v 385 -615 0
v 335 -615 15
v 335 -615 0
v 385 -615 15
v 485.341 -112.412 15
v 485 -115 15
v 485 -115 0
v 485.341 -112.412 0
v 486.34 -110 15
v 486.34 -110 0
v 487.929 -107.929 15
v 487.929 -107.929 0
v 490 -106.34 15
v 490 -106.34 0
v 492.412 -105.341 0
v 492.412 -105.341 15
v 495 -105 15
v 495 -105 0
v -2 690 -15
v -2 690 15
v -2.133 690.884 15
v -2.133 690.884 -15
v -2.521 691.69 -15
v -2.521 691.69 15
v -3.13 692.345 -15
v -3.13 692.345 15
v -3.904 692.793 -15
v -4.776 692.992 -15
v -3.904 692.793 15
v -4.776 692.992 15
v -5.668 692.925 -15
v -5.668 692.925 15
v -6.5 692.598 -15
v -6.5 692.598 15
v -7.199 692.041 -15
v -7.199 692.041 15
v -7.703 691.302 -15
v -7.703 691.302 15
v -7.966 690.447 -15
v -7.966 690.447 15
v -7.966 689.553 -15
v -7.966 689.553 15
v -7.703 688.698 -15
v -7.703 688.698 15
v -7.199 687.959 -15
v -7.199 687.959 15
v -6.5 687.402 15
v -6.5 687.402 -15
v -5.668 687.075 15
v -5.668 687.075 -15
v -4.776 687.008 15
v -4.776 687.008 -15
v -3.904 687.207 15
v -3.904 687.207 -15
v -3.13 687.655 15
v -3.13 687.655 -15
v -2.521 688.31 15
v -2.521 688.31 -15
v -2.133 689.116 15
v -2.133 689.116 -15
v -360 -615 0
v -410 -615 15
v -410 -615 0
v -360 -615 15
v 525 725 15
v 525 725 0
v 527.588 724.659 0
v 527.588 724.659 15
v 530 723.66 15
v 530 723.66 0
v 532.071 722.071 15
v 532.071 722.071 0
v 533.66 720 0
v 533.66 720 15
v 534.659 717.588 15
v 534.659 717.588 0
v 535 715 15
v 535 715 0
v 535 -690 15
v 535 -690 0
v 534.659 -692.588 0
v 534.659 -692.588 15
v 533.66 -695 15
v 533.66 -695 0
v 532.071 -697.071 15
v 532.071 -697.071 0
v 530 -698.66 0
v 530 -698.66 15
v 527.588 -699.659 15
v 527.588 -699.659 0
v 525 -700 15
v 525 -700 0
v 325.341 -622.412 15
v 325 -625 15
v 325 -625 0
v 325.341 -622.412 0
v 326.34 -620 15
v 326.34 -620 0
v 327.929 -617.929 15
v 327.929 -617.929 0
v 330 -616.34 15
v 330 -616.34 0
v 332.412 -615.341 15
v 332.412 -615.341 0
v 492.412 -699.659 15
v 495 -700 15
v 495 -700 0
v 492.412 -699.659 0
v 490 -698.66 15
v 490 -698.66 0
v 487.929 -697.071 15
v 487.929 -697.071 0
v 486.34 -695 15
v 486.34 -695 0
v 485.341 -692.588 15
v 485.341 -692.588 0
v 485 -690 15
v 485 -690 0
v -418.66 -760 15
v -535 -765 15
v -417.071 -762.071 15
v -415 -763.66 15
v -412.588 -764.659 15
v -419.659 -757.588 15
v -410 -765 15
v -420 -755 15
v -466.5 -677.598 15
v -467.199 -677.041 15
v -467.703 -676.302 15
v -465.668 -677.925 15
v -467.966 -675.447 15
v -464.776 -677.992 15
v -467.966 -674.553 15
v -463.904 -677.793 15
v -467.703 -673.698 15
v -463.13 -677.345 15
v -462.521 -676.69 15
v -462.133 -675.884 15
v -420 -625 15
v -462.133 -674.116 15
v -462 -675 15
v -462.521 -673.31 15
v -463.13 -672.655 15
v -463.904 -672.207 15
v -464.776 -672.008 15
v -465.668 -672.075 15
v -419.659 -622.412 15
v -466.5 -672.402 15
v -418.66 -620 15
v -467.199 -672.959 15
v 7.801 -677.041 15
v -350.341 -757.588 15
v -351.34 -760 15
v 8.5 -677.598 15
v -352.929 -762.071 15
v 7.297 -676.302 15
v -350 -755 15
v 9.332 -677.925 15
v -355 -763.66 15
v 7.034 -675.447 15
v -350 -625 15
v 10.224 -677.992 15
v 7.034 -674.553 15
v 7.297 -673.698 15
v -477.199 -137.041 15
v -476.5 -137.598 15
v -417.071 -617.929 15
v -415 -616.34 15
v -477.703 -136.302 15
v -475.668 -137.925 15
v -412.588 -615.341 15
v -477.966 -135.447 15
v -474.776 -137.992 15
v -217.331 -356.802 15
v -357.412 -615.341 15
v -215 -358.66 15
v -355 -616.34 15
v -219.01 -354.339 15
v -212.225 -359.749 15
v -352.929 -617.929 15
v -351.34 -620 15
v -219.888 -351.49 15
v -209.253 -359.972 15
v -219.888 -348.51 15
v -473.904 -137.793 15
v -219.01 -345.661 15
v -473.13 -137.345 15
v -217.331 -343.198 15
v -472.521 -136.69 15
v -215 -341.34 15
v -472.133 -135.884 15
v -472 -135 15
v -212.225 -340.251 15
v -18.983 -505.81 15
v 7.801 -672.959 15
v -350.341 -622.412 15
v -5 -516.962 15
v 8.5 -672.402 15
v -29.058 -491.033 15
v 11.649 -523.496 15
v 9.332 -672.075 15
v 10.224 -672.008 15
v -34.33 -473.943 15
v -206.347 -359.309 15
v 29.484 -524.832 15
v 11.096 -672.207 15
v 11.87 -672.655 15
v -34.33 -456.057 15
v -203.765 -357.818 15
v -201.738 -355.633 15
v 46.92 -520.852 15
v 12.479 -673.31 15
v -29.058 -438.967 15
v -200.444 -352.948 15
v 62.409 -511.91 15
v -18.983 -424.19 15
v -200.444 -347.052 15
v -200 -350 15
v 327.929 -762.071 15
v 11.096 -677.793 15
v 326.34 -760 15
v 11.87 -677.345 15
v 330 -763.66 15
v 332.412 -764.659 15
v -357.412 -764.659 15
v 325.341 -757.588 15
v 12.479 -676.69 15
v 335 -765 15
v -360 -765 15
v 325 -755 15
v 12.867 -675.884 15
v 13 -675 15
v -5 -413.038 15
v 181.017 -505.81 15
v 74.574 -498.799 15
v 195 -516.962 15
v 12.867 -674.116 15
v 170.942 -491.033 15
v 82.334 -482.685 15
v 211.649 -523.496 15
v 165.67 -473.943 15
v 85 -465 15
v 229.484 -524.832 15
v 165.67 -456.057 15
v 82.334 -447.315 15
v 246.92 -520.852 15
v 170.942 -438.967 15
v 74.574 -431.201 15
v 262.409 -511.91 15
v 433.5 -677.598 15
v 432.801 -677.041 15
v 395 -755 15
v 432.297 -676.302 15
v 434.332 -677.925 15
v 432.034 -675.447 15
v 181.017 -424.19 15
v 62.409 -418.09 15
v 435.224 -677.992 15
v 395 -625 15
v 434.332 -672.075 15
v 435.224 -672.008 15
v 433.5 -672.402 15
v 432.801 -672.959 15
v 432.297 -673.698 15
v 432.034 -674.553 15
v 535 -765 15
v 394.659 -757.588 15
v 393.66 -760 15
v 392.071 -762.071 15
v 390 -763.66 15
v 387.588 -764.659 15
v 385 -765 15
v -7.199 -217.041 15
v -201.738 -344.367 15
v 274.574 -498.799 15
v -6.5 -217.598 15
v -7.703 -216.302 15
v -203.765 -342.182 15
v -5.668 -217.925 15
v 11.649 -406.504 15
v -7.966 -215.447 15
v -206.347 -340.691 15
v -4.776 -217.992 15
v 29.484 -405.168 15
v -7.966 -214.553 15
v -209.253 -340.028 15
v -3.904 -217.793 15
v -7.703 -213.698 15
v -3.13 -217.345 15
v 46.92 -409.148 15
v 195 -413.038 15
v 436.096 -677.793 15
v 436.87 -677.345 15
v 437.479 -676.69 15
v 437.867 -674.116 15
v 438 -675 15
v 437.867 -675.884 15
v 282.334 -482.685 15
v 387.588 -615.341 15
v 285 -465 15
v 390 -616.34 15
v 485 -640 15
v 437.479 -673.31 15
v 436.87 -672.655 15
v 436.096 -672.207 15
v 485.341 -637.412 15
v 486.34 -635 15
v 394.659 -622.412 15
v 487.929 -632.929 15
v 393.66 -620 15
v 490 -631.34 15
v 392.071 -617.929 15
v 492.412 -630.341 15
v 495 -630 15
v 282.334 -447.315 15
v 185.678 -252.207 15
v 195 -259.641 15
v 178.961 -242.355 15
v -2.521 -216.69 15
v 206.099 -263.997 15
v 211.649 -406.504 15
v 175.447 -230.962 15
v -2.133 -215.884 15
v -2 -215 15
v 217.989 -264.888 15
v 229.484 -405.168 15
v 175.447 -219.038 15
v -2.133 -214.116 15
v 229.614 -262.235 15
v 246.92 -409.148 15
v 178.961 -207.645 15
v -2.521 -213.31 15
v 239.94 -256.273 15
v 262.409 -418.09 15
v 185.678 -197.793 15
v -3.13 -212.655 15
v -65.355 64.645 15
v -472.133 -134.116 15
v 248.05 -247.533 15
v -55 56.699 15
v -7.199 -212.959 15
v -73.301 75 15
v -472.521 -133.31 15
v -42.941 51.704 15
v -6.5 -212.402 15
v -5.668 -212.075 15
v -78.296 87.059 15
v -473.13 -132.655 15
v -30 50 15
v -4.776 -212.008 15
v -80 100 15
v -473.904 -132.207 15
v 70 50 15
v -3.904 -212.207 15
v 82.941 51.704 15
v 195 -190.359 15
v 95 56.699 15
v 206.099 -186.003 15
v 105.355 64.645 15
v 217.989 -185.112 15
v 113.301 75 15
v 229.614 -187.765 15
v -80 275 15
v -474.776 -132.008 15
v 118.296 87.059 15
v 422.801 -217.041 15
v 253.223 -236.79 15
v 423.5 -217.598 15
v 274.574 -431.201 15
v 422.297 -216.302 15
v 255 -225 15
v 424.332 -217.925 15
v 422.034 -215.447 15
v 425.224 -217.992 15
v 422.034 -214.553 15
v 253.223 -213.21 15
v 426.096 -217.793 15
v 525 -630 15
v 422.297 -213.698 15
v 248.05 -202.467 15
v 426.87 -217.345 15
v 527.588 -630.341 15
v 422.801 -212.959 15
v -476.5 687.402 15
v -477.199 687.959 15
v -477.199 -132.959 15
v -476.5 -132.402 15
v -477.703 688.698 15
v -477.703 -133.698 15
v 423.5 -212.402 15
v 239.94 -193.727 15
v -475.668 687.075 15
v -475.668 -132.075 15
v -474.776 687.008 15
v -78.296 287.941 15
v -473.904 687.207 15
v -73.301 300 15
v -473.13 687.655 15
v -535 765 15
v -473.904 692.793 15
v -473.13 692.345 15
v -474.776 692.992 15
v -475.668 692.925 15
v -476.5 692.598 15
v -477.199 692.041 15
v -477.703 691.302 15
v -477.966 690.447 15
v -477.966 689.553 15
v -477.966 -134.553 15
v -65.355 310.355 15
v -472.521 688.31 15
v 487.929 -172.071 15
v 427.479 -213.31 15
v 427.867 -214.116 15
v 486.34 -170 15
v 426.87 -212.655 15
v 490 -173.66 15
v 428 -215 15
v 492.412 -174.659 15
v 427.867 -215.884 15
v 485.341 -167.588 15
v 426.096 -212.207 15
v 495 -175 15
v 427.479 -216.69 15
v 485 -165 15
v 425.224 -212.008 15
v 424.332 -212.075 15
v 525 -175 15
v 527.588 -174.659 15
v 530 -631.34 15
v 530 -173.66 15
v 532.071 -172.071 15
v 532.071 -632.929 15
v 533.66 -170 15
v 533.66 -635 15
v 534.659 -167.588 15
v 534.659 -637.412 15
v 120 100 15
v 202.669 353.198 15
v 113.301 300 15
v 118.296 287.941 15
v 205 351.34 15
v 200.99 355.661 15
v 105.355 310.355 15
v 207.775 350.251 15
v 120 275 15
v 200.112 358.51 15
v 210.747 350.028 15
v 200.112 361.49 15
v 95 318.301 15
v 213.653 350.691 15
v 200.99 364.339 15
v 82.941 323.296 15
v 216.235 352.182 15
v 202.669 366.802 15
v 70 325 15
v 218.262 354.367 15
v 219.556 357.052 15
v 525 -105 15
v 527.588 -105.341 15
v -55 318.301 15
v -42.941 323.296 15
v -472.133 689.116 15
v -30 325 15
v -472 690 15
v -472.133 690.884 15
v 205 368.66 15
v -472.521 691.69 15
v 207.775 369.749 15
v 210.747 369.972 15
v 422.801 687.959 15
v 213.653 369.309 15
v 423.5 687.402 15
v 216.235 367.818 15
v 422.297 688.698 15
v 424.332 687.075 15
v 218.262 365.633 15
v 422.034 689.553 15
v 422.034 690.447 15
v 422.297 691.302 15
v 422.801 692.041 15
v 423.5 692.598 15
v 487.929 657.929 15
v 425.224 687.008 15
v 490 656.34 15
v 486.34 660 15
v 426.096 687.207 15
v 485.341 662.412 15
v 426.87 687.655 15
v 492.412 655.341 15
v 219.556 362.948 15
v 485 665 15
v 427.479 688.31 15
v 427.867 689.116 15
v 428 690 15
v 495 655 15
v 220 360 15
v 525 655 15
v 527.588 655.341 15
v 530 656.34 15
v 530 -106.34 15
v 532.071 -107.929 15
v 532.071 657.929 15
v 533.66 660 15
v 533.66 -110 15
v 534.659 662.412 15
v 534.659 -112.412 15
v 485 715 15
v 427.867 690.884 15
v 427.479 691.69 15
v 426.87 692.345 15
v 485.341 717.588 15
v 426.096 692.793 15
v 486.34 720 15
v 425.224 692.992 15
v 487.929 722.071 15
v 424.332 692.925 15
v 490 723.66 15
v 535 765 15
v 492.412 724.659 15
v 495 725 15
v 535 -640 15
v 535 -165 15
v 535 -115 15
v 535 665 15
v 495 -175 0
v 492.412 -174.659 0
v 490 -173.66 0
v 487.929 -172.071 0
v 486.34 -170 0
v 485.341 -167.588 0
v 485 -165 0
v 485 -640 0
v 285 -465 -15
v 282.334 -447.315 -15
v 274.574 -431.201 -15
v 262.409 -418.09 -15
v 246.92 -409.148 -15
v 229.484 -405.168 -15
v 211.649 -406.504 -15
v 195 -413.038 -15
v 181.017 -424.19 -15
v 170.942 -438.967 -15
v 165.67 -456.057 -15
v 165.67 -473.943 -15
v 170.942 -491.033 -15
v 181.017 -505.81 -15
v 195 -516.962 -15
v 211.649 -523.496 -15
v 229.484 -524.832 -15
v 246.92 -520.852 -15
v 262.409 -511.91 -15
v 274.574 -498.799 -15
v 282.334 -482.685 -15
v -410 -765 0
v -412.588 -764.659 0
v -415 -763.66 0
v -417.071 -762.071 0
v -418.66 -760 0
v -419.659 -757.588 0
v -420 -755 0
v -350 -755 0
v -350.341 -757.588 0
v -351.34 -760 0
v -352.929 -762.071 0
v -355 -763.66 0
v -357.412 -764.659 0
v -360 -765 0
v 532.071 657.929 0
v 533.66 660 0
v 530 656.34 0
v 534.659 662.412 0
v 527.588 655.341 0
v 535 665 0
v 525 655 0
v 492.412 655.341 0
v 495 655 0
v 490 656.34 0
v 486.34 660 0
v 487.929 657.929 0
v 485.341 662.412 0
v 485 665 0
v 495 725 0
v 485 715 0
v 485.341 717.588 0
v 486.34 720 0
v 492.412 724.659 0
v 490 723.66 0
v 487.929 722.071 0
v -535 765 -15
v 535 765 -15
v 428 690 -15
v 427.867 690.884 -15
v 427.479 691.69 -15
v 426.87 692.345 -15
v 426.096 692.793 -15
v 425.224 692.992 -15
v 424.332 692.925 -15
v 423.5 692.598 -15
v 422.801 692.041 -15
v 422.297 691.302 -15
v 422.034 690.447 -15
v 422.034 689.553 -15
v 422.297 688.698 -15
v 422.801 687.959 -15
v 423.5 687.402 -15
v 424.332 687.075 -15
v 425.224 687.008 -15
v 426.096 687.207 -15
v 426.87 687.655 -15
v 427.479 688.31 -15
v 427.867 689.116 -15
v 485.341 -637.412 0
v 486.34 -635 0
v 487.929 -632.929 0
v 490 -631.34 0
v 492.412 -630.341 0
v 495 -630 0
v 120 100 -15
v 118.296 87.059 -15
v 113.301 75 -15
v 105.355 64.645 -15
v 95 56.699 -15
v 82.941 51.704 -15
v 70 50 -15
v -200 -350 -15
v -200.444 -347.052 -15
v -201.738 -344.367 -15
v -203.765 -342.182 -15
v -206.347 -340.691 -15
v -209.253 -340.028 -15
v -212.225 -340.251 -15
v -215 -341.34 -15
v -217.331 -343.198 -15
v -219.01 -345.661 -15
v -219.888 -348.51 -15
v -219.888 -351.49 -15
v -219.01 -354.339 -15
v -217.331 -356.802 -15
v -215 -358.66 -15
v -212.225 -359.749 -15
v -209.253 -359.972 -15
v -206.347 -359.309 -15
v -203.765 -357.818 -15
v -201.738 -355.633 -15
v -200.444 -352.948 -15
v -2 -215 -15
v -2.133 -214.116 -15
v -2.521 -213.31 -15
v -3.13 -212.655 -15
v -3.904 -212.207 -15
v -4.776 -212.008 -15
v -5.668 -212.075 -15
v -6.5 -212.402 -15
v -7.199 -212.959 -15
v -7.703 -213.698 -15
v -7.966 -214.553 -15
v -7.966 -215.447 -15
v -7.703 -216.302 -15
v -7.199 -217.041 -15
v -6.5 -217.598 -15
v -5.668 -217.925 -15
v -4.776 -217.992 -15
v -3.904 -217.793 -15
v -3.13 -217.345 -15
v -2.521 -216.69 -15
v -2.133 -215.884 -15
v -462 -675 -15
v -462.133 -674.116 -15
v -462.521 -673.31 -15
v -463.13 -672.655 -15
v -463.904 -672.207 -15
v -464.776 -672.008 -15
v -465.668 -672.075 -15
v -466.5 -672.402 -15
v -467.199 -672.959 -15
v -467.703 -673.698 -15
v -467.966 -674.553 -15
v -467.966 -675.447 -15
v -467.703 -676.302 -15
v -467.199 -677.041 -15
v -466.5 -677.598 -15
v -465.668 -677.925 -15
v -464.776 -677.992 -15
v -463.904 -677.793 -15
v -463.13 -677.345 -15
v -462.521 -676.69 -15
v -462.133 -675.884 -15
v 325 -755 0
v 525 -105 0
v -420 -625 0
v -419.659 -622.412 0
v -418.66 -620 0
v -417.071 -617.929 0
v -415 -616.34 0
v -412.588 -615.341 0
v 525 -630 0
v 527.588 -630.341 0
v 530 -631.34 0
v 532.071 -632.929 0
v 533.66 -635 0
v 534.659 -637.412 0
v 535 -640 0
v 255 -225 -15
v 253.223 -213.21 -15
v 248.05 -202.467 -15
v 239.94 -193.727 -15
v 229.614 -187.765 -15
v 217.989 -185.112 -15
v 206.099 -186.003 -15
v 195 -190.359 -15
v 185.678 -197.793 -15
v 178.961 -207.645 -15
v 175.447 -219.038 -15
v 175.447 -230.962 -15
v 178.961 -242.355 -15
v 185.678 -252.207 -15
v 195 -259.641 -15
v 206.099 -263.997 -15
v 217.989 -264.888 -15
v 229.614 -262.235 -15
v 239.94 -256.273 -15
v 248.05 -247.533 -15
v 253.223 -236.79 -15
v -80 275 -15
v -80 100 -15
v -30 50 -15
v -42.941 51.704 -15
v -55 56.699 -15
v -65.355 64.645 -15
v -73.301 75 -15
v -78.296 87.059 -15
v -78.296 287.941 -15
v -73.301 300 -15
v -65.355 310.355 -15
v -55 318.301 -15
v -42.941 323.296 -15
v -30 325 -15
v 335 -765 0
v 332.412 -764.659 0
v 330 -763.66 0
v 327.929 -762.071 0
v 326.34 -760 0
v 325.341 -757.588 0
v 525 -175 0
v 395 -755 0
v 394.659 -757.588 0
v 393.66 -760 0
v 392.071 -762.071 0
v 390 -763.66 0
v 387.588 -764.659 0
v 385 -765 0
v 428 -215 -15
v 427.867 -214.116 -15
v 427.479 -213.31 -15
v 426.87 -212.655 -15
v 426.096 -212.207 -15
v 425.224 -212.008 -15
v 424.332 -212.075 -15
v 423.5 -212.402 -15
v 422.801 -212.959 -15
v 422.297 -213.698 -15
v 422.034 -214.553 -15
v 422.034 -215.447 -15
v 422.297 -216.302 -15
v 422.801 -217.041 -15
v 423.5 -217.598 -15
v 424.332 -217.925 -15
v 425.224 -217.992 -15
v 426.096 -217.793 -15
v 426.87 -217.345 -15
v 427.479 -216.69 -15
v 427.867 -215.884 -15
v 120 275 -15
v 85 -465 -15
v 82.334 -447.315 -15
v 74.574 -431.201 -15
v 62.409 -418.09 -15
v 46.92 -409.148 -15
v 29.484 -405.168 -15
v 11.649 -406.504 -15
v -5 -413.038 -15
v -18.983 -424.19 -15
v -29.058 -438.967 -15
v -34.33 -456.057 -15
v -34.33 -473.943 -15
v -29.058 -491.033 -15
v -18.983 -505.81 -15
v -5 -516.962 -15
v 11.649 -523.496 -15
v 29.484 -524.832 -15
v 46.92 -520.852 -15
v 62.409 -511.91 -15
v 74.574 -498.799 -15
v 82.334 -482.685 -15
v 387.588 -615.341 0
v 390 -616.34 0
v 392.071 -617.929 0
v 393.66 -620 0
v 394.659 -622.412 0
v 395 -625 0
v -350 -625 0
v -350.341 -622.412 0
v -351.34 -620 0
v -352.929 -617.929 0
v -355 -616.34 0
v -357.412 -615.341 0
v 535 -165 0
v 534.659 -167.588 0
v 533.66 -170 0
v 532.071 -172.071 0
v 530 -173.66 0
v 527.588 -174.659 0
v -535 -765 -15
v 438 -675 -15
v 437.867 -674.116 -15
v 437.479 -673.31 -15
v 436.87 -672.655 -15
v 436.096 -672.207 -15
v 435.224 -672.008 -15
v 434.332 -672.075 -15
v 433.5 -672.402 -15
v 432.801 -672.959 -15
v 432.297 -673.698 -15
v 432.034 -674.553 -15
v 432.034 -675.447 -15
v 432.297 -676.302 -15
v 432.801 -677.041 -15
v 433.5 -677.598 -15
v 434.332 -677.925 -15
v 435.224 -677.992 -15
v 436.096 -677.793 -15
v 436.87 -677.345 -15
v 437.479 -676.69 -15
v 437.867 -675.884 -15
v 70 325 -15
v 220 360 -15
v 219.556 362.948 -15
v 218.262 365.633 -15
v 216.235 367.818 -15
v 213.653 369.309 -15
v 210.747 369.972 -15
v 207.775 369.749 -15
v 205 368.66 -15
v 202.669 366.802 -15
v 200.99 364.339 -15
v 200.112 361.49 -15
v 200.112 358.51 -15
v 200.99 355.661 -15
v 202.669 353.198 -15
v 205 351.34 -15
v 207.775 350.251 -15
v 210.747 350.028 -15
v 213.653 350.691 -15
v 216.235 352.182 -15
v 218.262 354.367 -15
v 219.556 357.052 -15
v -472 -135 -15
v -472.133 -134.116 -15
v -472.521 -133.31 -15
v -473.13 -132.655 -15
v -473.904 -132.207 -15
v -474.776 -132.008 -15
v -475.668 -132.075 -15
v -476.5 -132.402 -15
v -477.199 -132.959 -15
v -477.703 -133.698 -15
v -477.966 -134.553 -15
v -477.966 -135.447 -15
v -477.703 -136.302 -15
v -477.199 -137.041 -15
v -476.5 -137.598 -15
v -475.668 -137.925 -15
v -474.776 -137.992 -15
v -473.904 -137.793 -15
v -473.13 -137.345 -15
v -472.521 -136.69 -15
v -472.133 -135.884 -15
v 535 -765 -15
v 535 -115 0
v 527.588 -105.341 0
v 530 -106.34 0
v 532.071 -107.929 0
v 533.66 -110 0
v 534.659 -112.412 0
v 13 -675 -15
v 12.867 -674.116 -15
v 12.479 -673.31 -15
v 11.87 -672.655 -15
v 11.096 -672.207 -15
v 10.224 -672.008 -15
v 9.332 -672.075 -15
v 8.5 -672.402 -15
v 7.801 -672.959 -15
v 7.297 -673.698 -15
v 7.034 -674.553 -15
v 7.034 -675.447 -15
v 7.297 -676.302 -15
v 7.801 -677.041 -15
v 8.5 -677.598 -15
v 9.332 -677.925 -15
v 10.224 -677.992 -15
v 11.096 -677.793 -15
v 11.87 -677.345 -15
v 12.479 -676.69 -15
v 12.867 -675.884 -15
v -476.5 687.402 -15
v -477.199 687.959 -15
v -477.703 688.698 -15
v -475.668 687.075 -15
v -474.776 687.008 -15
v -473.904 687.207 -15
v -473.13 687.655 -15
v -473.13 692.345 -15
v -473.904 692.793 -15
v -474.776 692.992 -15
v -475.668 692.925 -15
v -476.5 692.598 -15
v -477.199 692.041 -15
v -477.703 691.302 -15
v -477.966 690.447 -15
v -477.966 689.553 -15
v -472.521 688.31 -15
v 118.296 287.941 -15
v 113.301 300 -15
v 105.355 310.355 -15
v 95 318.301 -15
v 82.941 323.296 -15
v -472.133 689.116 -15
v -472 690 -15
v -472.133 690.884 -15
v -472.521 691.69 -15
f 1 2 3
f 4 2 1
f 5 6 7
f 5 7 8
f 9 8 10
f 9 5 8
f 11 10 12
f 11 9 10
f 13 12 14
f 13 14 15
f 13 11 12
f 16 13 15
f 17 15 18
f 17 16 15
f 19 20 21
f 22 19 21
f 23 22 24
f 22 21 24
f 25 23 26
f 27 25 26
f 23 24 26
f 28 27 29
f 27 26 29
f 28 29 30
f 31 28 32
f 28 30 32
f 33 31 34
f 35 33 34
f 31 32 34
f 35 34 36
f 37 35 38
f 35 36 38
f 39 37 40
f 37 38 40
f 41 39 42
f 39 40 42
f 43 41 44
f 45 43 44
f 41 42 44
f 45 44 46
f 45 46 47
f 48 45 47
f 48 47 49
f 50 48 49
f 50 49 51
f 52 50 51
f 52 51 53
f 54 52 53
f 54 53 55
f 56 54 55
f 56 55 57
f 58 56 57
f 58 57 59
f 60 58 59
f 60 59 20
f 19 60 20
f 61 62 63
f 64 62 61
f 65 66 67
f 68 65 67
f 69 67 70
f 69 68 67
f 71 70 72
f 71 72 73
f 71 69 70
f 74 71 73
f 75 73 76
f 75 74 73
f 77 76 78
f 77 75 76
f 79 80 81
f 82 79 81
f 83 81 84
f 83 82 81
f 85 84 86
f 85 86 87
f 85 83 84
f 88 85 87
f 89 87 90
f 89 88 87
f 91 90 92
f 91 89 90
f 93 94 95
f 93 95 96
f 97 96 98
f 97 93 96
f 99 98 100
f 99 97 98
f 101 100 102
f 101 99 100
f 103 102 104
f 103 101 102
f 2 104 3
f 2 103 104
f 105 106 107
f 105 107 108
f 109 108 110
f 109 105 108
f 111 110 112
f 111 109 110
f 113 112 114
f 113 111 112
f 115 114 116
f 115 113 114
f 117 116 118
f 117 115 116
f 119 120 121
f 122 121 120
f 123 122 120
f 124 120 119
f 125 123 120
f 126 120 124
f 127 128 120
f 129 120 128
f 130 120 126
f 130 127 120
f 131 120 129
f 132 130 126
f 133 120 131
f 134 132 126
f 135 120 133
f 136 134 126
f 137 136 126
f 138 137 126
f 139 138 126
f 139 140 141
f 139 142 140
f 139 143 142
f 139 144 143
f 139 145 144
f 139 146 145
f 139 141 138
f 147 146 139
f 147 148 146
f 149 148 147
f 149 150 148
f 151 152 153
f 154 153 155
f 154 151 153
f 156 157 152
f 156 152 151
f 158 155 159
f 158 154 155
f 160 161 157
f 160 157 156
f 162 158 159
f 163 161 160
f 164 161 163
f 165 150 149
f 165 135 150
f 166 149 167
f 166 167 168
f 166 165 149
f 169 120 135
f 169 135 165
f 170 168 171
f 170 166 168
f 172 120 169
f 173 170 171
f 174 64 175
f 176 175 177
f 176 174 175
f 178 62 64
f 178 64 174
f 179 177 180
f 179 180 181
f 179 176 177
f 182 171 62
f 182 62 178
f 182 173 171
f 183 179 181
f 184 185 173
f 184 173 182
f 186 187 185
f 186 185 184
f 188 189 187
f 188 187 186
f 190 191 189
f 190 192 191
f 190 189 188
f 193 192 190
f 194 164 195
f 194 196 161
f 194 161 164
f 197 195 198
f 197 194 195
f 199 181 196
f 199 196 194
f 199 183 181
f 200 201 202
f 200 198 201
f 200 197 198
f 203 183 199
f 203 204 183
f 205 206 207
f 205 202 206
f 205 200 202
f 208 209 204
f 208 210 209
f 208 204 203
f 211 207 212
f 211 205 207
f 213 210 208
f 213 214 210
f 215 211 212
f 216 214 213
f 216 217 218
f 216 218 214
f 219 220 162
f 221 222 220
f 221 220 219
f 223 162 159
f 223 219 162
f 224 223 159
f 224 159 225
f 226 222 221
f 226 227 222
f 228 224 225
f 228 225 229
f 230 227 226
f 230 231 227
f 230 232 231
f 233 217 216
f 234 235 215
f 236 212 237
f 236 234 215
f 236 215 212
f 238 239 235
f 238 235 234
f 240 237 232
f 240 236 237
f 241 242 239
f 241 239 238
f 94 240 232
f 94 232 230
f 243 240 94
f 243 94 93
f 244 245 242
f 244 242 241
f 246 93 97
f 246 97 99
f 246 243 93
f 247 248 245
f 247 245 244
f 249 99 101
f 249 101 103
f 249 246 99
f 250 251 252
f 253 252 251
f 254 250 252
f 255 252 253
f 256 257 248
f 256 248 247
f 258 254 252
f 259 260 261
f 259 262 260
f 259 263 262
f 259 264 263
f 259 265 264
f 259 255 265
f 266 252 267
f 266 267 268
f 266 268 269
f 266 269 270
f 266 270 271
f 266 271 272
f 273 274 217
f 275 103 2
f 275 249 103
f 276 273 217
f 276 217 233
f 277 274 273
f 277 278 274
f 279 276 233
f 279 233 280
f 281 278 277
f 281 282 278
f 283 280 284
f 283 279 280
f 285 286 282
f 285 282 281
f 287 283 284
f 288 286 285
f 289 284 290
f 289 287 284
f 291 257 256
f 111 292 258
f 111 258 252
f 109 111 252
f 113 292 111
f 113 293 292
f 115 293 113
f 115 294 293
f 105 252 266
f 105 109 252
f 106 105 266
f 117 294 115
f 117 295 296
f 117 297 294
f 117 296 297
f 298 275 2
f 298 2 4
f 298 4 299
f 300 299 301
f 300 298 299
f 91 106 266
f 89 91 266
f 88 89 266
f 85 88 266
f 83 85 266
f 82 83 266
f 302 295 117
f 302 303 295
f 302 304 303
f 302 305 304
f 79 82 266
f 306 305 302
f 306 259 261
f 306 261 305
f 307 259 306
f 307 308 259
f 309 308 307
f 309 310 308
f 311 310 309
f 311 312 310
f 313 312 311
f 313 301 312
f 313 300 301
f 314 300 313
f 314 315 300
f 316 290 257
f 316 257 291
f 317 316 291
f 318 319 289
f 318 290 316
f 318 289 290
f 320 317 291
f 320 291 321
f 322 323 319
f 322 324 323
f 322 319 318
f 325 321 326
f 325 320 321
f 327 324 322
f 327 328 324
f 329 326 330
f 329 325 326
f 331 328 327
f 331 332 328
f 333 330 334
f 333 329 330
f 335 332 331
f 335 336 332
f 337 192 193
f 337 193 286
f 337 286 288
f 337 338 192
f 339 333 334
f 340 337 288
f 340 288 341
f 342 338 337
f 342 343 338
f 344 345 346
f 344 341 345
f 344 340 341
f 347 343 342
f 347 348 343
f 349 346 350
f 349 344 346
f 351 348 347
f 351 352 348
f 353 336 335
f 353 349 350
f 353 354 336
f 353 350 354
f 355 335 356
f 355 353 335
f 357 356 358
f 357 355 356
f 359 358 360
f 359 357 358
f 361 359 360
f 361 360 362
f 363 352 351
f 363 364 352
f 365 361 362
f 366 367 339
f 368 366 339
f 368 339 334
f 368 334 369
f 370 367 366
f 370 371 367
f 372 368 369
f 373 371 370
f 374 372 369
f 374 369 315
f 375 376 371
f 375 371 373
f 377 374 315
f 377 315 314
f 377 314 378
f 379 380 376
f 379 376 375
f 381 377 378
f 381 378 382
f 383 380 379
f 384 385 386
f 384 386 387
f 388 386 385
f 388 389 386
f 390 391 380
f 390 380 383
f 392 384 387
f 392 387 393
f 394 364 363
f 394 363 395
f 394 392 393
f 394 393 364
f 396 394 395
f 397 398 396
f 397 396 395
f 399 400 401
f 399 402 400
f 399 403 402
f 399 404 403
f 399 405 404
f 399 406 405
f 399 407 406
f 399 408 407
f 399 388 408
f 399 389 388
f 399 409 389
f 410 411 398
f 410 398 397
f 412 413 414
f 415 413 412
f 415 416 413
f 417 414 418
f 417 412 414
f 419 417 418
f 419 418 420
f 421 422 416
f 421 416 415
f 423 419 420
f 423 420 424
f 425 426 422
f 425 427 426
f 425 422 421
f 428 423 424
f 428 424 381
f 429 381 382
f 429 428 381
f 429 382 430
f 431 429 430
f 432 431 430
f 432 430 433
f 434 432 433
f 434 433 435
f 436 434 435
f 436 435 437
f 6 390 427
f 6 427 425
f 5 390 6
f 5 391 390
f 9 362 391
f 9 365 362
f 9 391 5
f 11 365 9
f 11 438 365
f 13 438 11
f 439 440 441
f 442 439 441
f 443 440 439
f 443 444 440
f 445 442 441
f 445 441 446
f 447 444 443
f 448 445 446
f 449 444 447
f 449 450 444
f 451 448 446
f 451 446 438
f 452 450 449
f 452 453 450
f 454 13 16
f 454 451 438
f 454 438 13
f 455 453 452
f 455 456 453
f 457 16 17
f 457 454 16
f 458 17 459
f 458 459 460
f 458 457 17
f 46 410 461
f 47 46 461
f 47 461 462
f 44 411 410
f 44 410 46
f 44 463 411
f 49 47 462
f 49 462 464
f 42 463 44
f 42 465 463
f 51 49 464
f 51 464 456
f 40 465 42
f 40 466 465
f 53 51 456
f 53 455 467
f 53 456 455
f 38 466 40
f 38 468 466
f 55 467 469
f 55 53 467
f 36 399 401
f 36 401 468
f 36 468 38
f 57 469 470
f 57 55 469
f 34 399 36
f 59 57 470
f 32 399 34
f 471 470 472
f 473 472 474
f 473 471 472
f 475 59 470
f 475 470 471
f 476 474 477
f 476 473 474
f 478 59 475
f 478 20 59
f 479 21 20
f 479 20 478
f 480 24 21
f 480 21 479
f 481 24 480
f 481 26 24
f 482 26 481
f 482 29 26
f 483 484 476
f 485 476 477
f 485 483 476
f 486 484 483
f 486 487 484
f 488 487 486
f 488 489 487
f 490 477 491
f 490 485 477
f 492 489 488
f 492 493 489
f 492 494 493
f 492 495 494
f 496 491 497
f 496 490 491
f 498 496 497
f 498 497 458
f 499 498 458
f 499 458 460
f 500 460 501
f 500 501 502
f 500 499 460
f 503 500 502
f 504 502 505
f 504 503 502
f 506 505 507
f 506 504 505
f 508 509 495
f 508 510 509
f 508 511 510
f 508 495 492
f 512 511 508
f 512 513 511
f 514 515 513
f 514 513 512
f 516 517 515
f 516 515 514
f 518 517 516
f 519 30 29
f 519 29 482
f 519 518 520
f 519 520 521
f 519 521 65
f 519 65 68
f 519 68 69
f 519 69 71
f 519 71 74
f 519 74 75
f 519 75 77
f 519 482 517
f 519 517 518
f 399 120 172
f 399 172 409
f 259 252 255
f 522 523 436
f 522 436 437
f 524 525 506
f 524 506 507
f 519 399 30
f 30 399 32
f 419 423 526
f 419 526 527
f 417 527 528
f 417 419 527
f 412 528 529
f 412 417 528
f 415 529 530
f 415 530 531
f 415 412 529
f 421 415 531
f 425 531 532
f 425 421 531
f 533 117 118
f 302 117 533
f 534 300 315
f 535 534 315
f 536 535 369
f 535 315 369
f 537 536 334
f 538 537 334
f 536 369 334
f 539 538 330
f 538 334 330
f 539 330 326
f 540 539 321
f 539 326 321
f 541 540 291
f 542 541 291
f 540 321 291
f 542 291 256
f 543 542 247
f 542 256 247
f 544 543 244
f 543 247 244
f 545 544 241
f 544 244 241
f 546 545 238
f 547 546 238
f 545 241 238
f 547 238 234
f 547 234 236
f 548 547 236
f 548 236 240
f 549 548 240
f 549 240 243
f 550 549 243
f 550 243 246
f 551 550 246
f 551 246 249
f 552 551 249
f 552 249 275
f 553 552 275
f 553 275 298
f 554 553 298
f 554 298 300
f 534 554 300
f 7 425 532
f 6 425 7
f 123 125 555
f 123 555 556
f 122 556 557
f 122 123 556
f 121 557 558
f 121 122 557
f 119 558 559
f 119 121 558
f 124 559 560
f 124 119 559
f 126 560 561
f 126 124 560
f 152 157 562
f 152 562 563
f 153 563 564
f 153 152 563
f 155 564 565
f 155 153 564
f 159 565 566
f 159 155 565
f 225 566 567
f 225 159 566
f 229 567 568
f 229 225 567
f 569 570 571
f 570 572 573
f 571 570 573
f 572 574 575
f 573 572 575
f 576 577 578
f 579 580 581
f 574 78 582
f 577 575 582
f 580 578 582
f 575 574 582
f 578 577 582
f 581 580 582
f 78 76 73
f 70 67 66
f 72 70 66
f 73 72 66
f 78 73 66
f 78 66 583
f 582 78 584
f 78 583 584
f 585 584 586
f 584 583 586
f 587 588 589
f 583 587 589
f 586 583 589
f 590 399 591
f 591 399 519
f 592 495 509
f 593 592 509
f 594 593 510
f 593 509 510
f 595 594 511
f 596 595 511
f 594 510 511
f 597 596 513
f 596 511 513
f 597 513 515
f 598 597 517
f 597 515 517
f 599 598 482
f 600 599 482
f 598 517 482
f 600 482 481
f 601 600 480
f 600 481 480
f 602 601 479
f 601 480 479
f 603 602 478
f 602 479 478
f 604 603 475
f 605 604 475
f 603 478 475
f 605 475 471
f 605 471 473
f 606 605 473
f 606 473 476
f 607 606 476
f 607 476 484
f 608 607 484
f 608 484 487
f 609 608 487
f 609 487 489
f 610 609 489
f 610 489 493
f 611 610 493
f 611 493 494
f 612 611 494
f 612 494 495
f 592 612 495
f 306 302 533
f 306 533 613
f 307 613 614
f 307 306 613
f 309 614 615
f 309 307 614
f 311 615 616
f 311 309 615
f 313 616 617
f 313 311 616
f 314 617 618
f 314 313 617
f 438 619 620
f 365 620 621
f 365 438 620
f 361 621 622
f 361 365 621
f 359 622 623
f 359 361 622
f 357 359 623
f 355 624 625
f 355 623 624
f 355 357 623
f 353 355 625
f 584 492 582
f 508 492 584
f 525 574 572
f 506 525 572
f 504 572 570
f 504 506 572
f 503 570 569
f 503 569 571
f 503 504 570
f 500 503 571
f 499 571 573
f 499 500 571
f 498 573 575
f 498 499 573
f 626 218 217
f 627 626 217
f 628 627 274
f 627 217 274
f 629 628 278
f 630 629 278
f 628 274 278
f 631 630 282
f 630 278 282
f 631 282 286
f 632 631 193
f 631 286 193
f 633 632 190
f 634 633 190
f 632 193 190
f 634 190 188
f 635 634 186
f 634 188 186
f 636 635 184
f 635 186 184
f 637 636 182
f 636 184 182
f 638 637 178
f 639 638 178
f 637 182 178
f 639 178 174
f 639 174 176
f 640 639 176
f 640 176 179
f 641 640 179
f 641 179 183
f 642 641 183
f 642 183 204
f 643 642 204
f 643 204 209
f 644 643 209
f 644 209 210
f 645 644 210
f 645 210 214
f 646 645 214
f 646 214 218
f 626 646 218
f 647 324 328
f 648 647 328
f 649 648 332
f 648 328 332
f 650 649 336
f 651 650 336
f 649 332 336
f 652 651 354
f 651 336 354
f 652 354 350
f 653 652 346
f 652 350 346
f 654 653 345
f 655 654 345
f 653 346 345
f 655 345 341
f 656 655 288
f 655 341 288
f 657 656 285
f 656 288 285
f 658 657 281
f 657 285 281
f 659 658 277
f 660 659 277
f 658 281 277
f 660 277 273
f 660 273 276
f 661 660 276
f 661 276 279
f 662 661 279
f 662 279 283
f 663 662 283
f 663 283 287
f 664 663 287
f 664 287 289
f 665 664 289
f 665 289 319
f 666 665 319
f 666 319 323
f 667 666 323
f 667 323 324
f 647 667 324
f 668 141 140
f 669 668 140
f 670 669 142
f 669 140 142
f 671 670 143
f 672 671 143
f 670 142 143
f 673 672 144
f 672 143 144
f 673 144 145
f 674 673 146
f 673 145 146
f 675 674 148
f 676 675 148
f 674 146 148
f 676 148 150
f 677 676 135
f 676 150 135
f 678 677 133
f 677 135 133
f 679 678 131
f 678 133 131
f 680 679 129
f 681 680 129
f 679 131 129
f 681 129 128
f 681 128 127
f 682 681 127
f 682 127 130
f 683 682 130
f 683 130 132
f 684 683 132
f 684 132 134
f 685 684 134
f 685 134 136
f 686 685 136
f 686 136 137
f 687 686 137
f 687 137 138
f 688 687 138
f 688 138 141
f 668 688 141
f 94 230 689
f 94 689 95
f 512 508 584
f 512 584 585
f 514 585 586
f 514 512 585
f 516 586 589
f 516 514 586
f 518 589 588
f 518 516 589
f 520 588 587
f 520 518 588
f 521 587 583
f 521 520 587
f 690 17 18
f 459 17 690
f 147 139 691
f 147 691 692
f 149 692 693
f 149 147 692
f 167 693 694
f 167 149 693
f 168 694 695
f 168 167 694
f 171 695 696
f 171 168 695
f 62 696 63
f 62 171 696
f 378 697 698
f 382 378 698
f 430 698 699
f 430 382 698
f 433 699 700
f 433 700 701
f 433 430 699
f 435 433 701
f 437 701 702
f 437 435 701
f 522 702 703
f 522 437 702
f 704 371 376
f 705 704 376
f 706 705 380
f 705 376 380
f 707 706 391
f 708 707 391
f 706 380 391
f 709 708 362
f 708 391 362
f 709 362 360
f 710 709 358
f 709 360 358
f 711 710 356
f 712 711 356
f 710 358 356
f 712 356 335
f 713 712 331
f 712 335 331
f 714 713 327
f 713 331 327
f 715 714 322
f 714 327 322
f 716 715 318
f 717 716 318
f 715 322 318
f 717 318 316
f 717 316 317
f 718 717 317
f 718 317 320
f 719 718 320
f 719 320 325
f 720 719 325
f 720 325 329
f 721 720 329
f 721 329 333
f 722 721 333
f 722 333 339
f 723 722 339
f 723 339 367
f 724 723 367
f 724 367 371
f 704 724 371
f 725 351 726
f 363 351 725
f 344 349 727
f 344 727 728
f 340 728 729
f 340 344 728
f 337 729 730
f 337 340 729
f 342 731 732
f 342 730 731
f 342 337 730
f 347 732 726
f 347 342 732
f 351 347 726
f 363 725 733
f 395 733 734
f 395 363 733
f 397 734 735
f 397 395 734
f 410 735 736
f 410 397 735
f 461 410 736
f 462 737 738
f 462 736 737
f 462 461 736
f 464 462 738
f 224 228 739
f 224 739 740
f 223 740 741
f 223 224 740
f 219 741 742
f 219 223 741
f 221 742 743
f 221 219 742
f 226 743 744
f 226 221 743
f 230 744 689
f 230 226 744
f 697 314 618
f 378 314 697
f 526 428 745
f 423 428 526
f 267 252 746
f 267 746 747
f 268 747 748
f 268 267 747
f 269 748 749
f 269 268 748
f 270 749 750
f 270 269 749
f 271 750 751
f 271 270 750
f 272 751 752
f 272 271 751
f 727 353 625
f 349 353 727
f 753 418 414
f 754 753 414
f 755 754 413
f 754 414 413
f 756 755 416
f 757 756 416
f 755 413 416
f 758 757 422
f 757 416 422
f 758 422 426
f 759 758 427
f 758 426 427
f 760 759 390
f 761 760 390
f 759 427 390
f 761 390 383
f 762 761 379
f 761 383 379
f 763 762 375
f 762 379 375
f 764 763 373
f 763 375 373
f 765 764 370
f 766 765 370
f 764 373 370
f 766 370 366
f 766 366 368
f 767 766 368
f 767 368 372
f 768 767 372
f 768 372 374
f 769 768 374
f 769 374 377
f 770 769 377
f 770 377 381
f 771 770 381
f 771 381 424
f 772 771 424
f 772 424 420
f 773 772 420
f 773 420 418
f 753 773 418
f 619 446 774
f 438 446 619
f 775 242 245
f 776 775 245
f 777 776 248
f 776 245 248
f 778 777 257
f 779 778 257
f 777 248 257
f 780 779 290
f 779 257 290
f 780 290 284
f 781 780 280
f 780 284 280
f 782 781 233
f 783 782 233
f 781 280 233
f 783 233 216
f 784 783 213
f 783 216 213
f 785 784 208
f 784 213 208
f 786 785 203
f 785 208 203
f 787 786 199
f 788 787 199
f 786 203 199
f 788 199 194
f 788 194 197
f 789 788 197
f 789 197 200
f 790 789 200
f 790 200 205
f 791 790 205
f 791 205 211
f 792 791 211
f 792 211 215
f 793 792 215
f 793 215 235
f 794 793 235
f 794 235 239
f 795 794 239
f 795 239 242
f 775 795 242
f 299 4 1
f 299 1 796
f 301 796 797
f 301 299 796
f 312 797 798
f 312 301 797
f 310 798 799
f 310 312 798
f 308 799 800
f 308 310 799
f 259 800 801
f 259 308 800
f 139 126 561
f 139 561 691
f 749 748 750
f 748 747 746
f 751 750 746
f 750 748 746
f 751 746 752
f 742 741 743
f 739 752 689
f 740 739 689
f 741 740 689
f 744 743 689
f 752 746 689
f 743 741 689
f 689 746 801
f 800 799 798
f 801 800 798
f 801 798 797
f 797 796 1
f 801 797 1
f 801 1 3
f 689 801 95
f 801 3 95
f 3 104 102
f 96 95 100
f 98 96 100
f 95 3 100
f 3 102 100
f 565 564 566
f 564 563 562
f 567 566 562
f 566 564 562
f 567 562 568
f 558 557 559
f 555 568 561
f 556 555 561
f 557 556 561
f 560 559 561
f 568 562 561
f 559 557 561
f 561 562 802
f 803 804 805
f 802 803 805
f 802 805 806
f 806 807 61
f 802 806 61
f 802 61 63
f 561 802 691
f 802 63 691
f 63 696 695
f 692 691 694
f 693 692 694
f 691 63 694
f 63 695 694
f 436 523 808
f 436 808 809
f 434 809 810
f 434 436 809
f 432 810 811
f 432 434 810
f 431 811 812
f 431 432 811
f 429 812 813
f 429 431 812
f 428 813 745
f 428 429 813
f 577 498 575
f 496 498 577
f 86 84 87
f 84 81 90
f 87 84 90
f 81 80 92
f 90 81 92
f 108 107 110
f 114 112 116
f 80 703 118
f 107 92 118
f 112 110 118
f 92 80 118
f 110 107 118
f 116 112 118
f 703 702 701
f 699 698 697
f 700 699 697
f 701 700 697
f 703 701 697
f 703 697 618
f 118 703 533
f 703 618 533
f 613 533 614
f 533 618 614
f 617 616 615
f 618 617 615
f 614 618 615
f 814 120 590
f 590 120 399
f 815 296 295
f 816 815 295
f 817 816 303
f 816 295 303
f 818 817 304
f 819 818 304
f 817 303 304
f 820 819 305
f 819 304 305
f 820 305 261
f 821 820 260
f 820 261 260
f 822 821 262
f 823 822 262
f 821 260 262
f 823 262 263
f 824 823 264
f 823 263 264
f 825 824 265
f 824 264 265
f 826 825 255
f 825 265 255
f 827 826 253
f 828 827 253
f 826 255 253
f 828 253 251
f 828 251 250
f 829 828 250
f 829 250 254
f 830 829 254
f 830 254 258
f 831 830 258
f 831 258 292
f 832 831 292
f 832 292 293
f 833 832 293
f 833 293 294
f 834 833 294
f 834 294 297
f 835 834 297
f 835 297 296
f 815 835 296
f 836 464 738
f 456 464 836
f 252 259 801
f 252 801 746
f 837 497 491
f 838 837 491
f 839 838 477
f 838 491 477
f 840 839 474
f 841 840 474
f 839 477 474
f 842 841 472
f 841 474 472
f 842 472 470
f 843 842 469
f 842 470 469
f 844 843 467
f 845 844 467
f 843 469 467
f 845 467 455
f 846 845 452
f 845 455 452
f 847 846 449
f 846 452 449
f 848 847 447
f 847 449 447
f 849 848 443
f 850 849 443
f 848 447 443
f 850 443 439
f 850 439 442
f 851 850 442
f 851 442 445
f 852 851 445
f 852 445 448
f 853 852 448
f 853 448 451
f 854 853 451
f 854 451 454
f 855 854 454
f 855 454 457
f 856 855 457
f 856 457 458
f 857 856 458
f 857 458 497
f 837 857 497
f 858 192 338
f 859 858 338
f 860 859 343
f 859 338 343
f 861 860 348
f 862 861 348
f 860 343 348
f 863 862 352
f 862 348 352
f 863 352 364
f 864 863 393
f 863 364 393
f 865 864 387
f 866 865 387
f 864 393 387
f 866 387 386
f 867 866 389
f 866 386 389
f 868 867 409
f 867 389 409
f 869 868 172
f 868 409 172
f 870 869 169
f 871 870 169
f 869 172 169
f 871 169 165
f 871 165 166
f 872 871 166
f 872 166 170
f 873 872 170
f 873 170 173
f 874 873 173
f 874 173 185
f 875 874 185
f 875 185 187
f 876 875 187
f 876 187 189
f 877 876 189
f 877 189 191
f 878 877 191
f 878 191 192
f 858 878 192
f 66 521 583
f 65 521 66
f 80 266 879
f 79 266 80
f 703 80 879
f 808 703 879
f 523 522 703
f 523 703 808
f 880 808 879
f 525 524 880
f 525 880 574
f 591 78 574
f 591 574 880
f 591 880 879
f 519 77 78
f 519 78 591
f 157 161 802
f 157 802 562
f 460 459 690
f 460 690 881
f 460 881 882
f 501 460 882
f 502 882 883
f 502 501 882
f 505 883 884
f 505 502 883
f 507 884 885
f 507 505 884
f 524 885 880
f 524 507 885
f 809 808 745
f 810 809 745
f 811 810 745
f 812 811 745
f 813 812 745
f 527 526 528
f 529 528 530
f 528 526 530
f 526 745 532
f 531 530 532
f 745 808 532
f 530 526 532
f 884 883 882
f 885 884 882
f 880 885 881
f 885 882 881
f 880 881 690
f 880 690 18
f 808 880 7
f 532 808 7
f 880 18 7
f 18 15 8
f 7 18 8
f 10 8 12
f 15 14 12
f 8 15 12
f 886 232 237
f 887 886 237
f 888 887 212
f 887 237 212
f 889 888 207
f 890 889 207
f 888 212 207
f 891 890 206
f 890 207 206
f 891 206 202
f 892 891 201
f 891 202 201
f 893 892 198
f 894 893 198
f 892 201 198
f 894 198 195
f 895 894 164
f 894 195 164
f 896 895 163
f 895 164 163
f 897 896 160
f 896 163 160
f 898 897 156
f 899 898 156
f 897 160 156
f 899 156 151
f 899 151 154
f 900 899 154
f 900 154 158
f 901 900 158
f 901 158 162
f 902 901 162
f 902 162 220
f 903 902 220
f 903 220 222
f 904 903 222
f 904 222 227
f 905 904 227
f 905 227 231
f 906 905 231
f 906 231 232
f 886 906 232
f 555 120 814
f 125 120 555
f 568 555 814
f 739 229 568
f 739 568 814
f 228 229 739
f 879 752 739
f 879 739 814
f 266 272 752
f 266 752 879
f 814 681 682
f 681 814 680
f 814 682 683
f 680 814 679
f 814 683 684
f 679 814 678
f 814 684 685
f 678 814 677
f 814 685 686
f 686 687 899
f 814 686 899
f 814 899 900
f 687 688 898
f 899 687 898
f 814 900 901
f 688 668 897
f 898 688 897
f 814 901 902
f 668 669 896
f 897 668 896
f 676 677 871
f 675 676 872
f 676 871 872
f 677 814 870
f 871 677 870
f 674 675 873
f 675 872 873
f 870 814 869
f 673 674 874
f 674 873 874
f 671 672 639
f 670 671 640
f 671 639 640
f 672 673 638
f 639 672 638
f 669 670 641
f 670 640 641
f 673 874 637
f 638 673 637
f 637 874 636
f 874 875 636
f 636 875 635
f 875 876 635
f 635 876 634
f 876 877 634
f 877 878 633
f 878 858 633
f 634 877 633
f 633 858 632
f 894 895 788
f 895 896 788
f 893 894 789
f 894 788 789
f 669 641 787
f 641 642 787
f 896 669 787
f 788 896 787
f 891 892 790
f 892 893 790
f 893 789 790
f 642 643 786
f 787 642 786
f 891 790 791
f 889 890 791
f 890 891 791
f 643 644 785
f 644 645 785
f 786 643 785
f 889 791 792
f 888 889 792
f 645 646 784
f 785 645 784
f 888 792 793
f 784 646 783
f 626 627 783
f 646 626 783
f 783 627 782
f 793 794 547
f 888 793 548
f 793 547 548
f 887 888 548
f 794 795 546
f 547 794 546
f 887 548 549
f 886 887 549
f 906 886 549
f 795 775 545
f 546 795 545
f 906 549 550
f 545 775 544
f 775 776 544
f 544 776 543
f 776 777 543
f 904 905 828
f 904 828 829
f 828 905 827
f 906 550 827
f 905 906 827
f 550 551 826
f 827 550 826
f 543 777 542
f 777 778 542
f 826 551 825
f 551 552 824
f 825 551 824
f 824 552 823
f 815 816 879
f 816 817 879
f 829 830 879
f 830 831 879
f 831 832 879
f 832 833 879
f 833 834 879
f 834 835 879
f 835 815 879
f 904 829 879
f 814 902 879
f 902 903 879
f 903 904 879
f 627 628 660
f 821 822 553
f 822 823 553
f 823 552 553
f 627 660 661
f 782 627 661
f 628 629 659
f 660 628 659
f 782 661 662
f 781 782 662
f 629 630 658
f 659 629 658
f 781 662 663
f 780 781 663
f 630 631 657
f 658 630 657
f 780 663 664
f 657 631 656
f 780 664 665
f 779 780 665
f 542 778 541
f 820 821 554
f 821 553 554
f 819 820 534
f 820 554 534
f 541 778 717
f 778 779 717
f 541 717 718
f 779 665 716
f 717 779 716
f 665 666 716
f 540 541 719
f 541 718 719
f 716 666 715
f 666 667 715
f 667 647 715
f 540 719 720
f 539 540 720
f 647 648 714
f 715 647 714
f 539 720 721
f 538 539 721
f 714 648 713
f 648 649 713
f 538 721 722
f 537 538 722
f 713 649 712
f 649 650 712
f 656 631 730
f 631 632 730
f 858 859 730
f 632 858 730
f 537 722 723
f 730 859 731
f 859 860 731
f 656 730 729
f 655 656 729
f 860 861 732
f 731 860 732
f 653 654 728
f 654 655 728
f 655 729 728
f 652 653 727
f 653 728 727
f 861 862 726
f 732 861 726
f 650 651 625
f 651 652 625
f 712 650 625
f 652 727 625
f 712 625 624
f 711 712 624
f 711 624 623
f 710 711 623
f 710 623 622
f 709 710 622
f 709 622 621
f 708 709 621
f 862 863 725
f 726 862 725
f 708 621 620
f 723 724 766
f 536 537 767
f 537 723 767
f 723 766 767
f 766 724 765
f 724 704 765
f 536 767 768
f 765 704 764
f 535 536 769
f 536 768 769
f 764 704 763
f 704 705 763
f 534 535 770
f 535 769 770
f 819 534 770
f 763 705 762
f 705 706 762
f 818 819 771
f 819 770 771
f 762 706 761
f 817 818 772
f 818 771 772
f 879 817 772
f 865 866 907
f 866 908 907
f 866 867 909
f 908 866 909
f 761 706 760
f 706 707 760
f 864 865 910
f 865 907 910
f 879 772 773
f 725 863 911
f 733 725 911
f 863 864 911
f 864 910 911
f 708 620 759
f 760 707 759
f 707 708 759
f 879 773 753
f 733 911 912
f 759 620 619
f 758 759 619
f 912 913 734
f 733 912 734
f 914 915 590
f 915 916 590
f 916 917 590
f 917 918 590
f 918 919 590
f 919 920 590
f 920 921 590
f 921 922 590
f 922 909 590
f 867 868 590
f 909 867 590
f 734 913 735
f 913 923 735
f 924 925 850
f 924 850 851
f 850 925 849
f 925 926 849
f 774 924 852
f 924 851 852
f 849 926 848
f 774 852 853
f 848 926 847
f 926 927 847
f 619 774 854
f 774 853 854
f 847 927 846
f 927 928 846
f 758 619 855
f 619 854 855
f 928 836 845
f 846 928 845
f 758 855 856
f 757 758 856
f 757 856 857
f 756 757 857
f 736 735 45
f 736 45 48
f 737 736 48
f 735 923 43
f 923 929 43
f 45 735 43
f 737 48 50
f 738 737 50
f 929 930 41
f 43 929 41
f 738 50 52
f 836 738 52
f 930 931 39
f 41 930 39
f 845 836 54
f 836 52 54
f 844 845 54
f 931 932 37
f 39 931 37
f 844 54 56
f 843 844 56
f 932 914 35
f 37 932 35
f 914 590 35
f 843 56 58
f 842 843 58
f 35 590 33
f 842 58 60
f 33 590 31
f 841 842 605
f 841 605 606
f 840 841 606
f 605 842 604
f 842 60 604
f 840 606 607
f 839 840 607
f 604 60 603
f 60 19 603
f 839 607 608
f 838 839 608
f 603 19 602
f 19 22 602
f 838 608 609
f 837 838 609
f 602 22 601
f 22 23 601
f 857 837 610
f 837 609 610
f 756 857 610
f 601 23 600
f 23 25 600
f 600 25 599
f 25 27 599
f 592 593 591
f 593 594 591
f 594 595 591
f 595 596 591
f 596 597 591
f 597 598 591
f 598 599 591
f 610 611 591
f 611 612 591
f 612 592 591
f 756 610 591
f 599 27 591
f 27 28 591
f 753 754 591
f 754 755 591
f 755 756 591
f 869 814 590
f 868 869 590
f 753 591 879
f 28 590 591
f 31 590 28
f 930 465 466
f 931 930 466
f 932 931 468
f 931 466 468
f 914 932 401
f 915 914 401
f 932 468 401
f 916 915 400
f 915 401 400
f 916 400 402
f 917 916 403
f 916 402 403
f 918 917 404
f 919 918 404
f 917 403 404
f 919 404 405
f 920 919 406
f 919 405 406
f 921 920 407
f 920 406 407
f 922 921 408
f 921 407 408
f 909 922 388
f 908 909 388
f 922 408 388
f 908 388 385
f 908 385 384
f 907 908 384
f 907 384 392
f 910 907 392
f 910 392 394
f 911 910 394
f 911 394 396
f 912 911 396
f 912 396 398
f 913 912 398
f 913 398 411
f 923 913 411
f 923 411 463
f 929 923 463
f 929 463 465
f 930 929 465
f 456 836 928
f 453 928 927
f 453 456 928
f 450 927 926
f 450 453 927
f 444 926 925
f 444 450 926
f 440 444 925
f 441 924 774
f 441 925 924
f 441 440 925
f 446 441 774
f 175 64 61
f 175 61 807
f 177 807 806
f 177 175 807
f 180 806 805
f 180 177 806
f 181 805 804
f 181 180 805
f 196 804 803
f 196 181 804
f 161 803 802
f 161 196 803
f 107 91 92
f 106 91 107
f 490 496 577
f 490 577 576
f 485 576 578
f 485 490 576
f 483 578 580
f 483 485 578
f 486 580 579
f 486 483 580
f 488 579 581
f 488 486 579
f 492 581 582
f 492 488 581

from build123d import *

# Parameters (mm, degrees)
SKETCH_1_W          = 1070
SKETCH_1_H          = 1530
EXTRUDE_1_DEPTH     = 15
SKETCH_2_R          = 40
SKETCH_2_R_2        = 60
SKETCH_2_R_3        = 10
CUT_EXTRUDE_1_DEPTH = 934.996788003
CUT_EXTRUDE_2_DEPTH = 15
SKETCH_5_R          = 3
CUT_EXTRUDE_3_DEPTH = 934.996788003


with BuildPart() as part:
    # Эскиз1 → Бобышка-Вытянуть1 (new, symmetric)
    with BuildSketch(Plane.XY):
        Rectangle(SKETCH_1_W, SKETCH_1_H)
    extrude(amount=EXTRUDE_1_DEPTH, both=True)

    # Эскиз2 → Вырез-Вытянуть1 (cut, through all)
    with BuildSketch(Plane.XY.offset(15)):
        with Locations((215, -225)):
            Circle(SKETCH_2_R)
        with Locations((225, -465)):
            Circle(SKETCH_2_R_2)
        with Locations((25, -465)):
            Circle(SKETCH_2_R_2)
        with Locations((210, 360)):
            Circle(SKETCH_2_R_3)
        with Locations((-210, -350)):
            Circle(SKETCH_2_R_3)
        with BuildLine():
            Line((-30, 325), (70, 325))
            ThreePointArc((70, 325), (105.355339059, 310.355339059), (120, 275))
            Line((120, 275), (120, 100))
            ThreePointArc((120, 100), (105.355339059, 64.644660941), (70, 50))
            Line((70, 50), (-30, 50))
            ThreePointArc((-30, 50), (-65.355339059, 64.644660941), (-80, 100))
            Line((-80, 100), (-80, 275))
            ThreePointArc((-80, 275), (-65.355339059, 310.355339059), (-30, 325))
        make_face()
    extrude(amount=-CUT_EXTRUDE_1_DEPTH, mode=Mode.SUBTRACT)

    # Эскиз4 → Вырез-Вытянуть2 (cut)
    with BuildSketch(Plane.XY.offset(15)):
        with BuildLine():
            Line((495, -105), (525, -105))
            ThreePointArc((525, -105), (532.071067812, -107.928932188), (535, -115))
            Line((535, -115), (535, -165))
            ThreePointArc((535, -165), (532.071067812, -172.071067812), (525, -175))
            Line((525, -175), (495, -175))
            ThreePointArc((495, -175), (487.928932188, -172.071067812), (485, -165))
            Line((485, -165), (485, -115))
            ThreePointArc((485, -115), (487.928932188, -107.928932188), (495, -105))
        make_face()
        with BuildLine():
            Line((495, -630), (525, -630))
            ThreePointArc((525, -630), (532.071067812, -632.928932188), (535, -640))
            Line((535, -640), (535, -690))
            ThreePointArc((535, -690), (532.071067812, -697.071067812), (525, -700))
            Line((525, -700), (495, -700))
            ThreePointArc((495, -700), (487.928932188, -697.071067812), (485, -690))
            Line((485, -690), (485, -640))
            ThreePointArc((485, -640), (487.928932188, -632.928932188), (495, -630))
        make_face()
        with BuildLine():
            Line((-410, -615), (-360, -615))
            ThreePointArc((-360, -615), (-352.928932188, -617.928932188), (-350, -625))
            Line((-350, -625), (-350, -755))
            ThreePointArc((-350, -755), (-352.928932188, -762.071067812), (-360, -765))
            Line((-360, -765), (-410, -765))
            ThreePointArc((-410, -765), (-417.071067812, -762.071067812), (-420, -755))
            Line((-420, -755), (-420, -625))
            ThreePointArc((-420, -625), (-417.071067812, -617.928932188), (-410, -615))
        make_face()
        with BuildLine():
            Line((495, 725), (525, 725))
            ThreePointArc((525, 725), (532.071067812, 722.071067812), (535, 715))
            Line((535, 715), (535, 665))
            ThreePointArc((535, 665), (532.071067812, 657.928932188), (525, 655))
            Line((525, 655), (495, 655))
            ThreePointArc((495, 655), (487.928932188, 657.928932188), (485, 665))
            Line((485, 665), (485, 715))
            ThreePointArc((485, 715), (487.928932188, 722.071067812), (495, 725))
        make_face()
        with BuildLine():
            Line((335, -615), (385, -615))
            ThreePointArc((385, -615), (392.071067812, -617.928932188), (395, -625))
            Line((395, -625), (395, -755))
            ThreePointArc((395, -755), (392.071067812, -762.071067812), (385, -765))
            Line((385, -765), (335, -765))
            ThreePointArc((335, -765), (327.928932188, -762.071067812), (325, -755))
            Line((325, -755), (325, -625))
            ThreePointArc((325, -625), (327.928932188, -617.928932188), (335, -615))
        make_face()
    extrude(amount=-CUT_EXTRUDE_2_DEPTH, mode=Mode.SUBTRACT)

    # Эскиз5 → Вырез-Вытянуть3 (cut, through all)
    with BuildSketch(Plane.XY.offset(15)):
        with Locations((-475, 690)):
            Circle(SKETCH_5_R)
        with Locations((-5, 690)):
            Circle(SKETCH_5_R)
        with Locations((425, 690)):
            Circle(SKETCH_5_R)
        with Locations((-475, -135)):
            Circle(SKETCH_5_R)
        with Locations((-5, -215)):
            Circle(SKETCH_5_R)
        with Locations((425, -215)):
            Circle(SKETCH_5_R)
        with Locations((-465, -675)):
            Circle(SKETCH_5_R)
        with Locations((10, -675)):
            Circle(SKETCH_5_R)
        with Locations((435, -675)):
            Circle(SKETCH_5_R)
    extrude(amount=-CUT_EXTRUDE_3_DEPTH, mode=Mode.SUBTRACT)


solid = part.part
